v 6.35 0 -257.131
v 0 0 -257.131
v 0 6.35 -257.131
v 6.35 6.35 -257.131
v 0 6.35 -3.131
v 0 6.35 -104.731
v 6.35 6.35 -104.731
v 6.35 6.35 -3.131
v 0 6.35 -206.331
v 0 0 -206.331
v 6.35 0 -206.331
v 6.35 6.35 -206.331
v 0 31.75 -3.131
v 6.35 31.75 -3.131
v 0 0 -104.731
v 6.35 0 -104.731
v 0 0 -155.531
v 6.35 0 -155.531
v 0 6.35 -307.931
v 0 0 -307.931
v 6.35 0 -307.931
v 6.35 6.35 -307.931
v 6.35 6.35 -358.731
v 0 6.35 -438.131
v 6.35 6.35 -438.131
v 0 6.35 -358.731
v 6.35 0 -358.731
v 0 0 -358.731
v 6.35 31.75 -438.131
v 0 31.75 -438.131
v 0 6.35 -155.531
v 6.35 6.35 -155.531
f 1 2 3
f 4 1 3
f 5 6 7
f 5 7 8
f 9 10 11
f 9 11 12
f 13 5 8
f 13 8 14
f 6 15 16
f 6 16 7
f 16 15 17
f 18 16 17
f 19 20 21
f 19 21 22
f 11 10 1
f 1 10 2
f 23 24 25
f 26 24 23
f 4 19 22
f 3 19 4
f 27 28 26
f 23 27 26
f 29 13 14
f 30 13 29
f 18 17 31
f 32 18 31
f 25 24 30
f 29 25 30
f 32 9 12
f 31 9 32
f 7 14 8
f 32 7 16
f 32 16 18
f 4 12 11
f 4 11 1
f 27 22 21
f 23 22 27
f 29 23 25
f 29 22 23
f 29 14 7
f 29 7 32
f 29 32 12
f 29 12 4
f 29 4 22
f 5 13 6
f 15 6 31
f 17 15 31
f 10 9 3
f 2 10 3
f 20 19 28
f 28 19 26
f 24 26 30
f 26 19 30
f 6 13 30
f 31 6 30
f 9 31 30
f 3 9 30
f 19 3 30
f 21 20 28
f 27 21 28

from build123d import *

# Parameters (mm, degrees)
SKETCH1_W           = 435
SKETCH1_H           = 31.75
BOSS_EXTRUDE1_DEPTH = 6.35
CUT_EXTRUDE1_REACH  = 441.326
SKETCH2_W           = 101.6
SKETCH2_H           = 6.35
CUT_EXTRUDE2_REACH  = 441.326
SKETCH3_W           = 50.8
SKETCH3_H           = 6.35
SKETCH3_W_2         = 79.4


with BuildPart() as part:
    # Sketch1 → Boss-Extrude1 (new body)
    with BuildSketch(Plane(origin=(0, 0, 0), x_dir=(0, 0, -1), z_dir=(1, 0, 0))):
        with Locations((220.631015664, 15.875)):
            Rectangle(SKETCH1_W, SKETCH1_H)
    extrude(amount=BOSS_EXTRUDE1_DEPTH)

    # Sketch2 → Cut-Extrude1 (cut, up to next)
    with BuildSketch(Plane.ZY, mode=Mode.PRIVATE) as cut_extrude1_sk1:
        with Locations((-53.931015664, 3.175)):
            Rectangle(SKETCH2_W, SKETCH2_H)
    cut_extrude1_tool1 = extrude(cut_extrude1_sk1.sketch, amount=-CUT_EXTRUDE1_REACH, mode=Mode.PRIVATE) & part.part
    add(cut_extrude1_tool1.solids().sort_by_distance((0, 3.175, -53.931016))[0], mode=Mode.SUBTRACT)

    # Sketch3 → Cut-Extrude2 (cut, up to next)
    with BuildSketch(Plane.ZY, mode=Mode.PRIVATE) as cut_extrude2_sk1:
        with Locations((-180.931015664, 3.175)):
            Rectangle(SKETCH3_W, SKETCH3_H)
    cut_extrude2_tool1 = extrude(cut_extrude2_sk1.sketch, amount=-CUT_EXTRUDE2_REACH, mode=Mode.PRIVATE) & part.part
    # Sketch3 → Cut-Extrude2 (cut, up to next)
    with BuildSketch(Plane.ZY, mode=Mode.PRIVATE) as cut_extrude2_sk2:
        with Locations((-282.531015664, 3.175)):
            Rectangle(SKETCH3_W, SKETCH3_H)
    cut_extrude2_tool2 = extrude(cut_extrude2_sk2.sketch, amount=-CUT_EXTRUDE2_REACH, mode=Mode.PRIVATE) & part.part
    # Sketch3 → Cut-Extrude2 (cut, up to next)
    with BuildSketch(Plane.ZY, mode=Mode.PRIVATE) as cut_extrude2_sk3:
        with Locations((-398.431015664, 3.175)):
            Rectangle(SKETCH3_W_2, SKETCH3_H)
    cut_extrude2_tool3 = extrude(cut_extrude2_sk3.sketch, amount=-CUT_EXTRUDE2_REACH, mode=Mode.PRIVATE) & part.part
    add(cut_extrude2_tool1.solids().sort_by_distance((0, 3.175, -180.931016))[0], mode=Mode.SUBTRACT)
    add(cut_extrude2_tool2.solids().sort_by_distance((0, 3.175, -282.531016))[0], mode=Mode.SUBTRACT)
    add(cut_extrude2_tool3.solids().sort_by_distance((0, 3.175, -398.431016))[0], mode=Mode.SUBTRACT)


solid = part.part
